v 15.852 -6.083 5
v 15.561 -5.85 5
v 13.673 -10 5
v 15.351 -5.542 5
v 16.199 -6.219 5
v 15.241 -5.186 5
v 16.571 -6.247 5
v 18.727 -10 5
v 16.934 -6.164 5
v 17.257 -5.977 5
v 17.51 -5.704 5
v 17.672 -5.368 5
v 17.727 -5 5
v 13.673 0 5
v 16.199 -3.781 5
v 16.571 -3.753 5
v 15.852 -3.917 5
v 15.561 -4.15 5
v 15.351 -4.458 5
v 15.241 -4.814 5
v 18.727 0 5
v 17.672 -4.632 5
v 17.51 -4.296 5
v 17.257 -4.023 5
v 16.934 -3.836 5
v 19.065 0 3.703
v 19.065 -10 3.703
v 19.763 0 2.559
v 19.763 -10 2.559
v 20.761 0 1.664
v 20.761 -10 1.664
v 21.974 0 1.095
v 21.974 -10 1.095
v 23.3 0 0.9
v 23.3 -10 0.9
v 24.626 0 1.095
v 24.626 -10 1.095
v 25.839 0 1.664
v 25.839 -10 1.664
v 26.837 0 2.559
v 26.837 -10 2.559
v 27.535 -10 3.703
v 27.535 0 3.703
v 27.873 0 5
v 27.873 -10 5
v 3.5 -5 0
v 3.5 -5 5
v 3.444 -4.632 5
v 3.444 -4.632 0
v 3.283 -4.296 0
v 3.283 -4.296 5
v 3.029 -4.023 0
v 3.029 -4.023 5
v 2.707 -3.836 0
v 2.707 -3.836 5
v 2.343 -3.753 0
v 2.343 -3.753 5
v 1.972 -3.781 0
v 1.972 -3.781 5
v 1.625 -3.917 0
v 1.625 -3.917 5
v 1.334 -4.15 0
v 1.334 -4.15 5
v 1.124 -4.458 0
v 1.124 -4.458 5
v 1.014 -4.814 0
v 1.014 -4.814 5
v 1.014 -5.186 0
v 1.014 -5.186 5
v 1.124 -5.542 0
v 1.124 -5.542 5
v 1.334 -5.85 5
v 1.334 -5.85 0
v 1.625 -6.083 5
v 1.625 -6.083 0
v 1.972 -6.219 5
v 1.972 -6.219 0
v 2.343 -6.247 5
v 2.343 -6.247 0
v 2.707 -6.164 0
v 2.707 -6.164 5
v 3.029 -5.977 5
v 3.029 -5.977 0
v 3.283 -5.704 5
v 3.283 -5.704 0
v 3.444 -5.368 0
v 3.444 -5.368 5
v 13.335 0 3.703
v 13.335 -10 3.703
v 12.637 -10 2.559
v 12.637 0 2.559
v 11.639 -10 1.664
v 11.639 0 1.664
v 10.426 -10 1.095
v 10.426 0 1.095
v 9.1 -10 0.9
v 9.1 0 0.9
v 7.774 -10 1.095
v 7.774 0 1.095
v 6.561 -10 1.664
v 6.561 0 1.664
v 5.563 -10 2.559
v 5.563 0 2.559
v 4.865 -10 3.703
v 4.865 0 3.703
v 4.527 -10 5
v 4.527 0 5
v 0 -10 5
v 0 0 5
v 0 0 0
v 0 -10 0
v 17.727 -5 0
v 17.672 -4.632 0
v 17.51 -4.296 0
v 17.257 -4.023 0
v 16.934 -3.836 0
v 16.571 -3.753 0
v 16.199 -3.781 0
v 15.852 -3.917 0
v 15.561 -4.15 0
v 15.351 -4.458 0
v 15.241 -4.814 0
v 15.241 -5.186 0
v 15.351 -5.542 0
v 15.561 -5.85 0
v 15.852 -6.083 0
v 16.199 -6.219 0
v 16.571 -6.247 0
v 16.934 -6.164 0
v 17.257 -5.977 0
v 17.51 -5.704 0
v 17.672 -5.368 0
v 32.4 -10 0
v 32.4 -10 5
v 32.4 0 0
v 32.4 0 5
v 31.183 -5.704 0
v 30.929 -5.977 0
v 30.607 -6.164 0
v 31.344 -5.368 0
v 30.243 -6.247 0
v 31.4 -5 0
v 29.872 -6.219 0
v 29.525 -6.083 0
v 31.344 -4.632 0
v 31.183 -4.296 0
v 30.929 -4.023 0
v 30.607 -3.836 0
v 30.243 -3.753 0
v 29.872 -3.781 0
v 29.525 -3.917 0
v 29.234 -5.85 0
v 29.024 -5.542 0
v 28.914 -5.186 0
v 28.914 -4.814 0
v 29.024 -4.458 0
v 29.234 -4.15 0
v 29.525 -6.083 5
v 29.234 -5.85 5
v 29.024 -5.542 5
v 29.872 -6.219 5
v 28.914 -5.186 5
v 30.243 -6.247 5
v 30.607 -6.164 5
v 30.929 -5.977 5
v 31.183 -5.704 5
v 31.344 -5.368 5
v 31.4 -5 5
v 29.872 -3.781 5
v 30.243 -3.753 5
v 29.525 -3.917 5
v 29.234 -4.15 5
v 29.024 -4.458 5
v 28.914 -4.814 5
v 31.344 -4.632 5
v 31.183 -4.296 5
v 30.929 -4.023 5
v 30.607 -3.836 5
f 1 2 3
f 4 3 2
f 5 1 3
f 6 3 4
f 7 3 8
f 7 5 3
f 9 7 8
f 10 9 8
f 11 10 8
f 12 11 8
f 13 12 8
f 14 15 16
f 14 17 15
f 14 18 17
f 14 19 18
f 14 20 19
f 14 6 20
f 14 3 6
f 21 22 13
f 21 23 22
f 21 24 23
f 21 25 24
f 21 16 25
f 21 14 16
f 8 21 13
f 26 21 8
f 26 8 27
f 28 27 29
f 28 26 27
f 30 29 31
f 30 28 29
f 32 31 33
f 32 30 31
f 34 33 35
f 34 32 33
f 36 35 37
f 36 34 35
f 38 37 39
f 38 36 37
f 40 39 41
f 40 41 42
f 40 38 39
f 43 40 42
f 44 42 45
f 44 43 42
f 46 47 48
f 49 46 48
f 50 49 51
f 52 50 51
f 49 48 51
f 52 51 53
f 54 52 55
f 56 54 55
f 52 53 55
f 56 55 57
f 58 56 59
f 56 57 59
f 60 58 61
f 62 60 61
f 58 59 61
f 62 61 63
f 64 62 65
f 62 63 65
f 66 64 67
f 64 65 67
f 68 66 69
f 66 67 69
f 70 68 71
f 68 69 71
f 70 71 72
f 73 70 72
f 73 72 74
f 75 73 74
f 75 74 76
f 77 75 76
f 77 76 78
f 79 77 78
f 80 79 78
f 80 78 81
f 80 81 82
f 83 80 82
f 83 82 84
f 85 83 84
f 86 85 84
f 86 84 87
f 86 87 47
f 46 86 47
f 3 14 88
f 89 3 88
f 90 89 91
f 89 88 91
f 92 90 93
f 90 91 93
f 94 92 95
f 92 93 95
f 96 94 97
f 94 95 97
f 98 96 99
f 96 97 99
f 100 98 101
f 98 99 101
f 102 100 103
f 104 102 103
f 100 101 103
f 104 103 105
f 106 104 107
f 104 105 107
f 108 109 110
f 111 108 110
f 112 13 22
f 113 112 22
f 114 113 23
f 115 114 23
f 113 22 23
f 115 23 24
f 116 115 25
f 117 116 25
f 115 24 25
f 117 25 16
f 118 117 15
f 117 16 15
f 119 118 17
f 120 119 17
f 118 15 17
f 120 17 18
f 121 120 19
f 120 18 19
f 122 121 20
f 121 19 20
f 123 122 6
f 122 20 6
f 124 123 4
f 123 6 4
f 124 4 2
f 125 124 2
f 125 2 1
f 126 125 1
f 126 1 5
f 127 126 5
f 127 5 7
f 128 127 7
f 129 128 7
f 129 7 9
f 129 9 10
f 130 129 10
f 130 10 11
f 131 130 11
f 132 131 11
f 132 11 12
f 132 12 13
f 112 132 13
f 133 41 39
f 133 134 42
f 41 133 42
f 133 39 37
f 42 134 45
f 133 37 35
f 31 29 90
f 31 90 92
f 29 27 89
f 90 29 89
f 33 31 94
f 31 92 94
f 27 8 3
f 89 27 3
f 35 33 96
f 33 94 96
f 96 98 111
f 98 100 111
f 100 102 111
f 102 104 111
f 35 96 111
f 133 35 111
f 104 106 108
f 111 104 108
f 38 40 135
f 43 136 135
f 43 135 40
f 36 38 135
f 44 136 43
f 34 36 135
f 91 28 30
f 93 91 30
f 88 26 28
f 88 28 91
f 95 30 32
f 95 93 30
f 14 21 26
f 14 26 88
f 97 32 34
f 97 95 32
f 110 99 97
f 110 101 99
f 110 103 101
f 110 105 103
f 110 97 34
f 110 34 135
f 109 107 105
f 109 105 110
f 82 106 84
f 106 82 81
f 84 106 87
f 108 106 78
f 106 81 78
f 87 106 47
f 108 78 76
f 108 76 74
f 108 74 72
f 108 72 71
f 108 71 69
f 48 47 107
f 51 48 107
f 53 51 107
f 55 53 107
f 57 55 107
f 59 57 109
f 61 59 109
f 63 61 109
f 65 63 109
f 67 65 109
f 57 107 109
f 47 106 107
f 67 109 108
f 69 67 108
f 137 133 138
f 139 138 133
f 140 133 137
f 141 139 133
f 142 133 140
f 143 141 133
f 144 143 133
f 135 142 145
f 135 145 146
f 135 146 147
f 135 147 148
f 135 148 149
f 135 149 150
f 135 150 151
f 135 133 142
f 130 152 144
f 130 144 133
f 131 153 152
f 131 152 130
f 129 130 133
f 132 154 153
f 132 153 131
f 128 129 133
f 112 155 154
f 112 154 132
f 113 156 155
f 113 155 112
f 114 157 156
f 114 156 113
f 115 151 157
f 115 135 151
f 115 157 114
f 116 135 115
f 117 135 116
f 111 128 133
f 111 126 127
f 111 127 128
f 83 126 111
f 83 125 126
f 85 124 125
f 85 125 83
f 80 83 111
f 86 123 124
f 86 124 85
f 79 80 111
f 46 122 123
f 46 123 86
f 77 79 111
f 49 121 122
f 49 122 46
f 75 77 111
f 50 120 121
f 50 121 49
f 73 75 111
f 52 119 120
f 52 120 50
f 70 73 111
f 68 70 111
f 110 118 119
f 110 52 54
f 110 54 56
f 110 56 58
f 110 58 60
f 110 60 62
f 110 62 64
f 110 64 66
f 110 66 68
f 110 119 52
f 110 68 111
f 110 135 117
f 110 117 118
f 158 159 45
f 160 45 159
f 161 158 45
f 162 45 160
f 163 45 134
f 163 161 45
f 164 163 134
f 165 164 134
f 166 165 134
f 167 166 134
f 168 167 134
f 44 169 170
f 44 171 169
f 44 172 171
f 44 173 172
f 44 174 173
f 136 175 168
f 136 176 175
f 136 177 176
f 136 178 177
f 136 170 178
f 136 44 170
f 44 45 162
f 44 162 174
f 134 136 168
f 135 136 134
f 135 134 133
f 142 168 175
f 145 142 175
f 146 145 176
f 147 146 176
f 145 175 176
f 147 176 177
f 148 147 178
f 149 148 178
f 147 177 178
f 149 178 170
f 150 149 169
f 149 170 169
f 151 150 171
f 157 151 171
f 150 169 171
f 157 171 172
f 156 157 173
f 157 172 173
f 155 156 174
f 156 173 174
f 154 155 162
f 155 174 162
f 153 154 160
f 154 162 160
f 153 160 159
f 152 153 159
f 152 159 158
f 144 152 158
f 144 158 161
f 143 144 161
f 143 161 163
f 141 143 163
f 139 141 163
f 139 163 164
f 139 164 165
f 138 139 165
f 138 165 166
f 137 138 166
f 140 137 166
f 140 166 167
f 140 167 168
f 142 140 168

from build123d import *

# Parameters (mm, degrees)
F1_DEPTH = 10
F3_R     = 1.25
F4_DEPTH = 5.001


with BuildPart() as f1:
    # F0 (on Front) → F1 (new body)
    with BuildSketch(Plane.XZ):
        with BuildLine():
            Line((4.527255, 5), (0, 5))
            Line((0, 5), (0, 0))
            Line((0, 0), (16.2, 0))
            Line((16.2, 0), (16.2, 5))
            Line((16.2, 5), (13.672745, 5))
            ThreePointArc((13.672745, 5), (9.1, 0.9), (4.527255, 5))
        make_face()
    extrude(amount=F1_DEPTH)

    # F2: F1 across face


with BuildPart() as f1_1:
    add(f1.part)
    add(f1.part.mirror(Plane(origin=(16.2, -5, 2.5), x_dir=(0, 1, 0), z_dir=(1, 0, 0))))

    # F3 (on face) → F4 (cut, through all)
    with BuildSketch(Plane.XY.offset(5)):
        with Locations((2.25, -5)):
            Circle(F3_R)
        with Locations((16.477255, -5)):
            Circle(F3_R)
        with Locations((30.15, -5)):
            Circle(F3_R)
    extrude(amount=-F4_DEPTH, mode=Mode.SUBTRACT)


solid = f1_1.part
